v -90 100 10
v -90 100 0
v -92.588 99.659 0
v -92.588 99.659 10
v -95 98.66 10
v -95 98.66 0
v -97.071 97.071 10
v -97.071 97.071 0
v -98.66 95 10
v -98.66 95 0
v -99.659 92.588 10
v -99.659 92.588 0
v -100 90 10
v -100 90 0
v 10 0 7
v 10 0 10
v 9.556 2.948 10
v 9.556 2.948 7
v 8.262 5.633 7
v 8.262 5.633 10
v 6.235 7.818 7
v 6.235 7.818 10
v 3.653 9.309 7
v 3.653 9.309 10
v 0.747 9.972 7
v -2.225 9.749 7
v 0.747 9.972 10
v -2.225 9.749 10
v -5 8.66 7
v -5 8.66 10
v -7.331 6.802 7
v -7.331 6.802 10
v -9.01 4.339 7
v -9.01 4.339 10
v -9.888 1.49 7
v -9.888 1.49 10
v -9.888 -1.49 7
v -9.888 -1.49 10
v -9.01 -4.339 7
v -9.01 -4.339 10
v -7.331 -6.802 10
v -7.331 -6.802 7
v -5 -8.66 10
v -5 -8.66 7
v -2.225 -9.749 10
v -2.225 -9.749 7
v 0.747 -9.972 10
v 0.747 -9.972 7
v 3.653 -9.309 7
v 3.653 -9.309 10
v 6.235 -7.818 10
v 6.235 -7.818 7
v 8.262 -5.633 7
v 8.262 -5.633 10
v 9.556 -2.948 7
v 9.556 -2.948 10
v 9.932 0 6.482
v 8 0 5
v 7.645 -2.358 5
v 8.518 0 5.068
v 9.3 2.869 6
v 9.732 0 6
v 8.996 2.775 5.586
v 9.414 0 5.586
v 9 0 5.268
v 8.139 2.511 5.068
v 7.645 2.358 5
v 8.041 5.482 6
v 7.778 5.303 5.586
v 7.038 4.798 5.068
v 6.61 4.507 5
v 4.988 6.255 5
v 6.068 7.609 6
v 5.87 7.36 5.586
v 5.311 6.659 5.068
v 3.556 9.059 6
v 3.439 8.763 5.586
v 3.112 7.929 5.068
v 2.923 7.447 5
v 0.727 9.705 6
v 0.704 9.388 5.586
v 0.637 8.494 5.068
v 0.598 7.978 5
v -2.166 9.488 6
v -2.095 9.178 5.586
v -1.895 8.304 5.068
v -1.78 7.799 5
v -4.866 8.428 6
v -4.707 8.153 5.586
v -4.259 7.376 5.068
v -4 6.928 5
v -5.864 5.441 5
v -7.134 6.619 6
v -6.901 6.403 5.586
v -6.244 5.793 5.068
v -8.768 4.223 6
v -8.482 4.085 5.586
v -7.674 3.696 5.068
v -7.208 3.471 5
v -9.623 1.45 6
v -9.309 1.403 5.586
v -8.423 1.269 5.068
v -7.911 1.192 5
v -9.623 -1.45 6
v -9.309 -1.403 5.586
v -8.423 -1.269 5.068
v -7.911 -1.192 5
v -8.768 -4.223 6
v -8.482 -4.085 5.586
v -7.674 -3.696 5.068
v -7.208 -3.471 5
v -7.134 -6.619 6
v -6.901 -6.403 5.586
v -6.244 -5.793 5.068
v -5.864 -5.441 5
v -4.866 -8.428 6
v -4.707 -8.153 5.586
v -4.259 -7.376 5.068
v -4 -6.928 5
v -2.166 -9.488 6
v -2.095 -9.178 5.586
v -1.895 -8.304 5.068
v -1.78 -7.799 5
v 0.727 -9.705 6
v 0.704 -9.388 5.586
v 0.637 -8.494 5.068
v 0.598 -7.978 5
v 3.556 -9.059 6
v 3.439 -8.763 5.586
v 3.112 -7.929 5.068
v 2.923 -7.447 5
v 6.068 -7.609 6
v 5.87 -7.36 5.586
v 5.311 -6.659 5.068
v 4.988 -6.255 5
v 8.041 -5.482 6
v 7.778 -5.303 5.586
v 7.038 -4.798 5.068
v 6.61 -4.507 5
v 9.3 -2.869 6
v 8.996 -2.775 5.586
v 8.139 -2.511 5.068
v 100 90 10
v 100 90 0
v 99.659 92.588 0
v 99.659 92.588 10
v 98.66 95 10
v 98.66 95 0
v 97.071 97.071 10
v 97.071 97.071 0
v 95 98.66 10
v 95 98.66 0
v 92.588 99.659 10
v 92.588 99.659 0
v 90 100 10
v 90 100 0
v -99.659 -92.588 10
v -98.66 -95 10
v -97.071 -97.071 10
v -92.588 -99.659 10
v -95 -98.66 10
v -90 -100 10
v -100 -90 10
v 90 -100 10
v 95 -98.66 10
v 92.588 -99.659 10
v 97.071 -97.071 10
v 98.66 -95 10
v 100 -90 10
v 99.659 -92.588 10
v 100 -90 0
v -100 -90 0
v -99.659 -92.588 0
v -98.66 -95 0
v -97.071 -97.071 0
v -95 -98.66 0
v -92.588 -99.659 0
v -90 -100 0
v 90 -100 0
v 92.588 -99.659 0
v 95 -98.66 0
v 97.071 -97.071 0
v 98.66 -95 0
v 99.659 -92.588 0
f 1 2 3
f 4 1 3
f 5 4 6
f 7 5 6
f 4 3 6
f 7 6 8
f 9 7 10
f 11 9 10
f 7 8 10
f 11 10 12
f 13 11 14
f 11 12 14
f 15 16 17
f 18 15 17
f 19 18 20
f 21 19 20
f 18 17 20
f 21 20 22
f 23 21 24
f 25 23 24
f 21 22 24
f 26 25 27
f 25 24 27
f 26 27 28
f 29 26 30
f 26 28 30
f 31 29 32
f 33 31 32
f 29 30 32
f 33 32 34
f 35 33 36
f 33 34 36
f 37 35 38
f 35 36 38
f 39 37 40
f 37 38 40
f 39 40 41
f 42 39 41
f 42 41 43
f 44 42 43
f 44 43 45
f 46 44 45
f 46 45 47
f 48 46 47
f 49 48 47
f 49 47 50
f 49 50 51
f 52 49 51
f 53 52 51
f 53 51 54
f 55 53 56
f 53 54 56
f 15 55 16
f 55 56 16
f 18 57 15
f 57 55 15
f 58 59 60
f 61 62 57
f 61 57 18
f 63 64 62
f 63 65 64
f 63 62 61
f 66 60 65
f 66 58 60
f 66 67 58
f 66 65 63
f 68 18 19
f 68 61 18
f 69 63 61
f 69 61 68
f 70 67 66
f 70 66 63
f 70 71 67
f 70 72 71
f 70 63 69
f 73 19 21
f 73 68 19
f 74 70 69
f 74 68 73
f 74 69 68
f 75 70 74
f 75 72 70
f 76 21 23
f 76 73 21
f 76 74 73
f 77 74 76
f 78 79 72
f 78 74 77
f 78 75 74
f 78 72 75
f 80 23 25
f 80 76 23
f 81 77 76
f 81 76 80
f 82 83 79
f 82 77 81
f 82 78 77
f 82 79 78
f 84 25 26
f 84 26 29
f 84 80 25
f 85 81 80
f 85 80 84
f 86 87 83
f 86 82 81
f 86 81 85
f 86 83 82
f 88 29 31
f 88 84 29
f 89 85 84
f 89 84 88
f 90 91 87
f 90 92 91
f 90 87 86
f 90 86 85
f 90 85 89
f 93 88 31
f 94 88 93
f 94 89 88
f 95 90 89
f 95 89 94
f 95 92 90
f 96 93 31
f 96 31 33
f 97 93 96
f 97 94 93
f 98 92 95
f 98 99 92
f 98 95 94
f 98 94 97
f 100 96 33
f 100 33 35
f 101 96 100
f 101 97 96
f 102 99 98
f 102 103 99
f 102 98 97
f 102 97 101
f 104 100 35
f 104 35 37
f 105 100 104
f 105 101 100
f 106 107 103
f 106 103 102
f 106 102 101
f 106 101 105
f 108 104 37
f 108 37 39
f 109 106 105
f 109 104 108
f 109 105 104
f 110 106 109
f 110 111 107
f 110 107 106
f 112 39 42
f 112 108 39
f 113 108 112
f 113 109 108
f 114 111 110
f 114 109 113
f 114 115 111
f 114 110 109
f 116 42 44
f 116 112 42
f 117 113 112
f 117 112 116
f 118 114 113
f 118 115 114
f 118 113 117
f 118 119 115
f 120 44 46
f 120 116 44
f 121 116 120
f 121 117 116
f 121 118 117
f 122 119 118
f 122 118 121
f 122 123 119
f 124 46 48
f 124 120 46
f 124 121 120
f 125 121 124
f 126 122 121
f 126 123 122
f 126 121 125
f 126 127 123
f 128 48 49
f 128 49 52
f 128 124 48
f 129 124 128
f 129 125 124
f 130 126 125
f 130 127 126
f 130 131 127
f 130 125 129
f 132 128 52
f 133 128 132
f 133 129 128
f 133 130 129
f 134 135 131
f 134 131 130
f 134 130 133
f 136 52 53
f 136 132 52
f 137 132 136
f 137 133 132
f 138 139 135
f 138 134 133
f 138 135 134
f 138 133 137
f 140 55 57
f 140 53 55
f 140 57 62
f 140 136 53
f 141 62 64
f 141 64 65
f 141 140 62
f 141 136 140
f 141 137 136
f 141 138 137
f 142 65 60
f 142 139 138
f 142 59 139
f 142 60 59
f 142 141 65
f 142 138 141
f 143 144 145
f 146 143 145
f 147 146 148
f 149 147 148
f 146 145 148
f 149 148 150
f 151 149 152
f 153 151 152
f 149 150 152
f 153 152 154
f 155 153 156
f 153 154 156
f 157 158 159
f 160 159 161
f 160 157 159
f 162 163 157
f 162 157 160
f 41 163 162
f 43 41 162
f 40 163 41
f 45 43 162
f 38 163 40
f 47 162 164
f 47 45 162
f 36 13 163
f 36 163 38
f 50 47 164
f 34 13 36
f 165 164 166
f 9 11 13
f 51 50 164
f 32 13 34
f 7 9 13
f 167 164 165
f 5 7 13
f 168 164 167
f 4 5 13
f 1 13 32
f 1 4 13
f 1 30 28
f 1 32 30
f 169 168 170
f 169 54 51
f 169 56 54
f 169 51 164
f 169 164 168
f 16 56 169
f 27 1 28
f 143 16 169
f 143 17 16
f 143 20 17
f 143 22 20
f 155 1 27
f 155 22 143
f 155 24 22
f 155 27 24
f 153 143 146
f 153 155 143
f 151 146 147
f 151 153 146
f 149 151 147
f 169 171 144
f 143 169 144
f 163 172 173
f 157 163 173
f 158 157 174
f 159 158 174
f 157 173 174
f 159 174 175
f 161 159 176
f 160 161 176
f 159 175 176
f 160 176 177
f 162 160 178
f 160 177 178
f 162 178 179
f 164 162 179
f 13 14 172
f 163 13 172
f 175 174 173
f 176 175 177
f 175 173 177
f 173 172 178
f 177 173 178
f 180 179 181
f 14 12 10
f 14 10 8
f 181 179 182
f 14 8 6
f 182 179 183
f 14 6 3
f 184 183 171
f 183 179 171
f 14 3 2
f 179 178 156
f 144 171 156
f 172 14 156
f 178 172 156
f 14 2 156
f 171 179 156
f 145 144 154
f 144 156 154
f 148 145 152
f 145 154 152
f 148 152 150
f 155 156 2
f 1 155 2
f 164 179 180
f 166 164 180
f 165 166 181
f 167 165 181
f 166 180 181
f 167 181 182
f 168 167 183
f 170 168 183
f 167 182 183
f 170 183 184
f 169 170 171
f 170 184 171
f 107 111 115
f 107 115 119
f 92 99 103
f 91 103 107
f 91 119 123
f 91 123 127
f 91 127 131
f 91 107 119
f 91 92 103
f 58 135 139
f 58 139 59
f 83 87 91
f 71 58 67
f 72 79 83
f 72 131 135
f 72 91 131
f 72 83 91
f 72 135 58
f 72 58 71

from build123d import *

# Parameters (mm, degrees)
BOSS_EXTRUDE1_DEPTH = 10
SKETCH2_R           = 10
CUT_EXTRUDE2_DEPTH  = 5
FILLET1_R           = 2


with BuildPart() as part:
    # Sketch1 → Boss-Extrude1 (new body)
    with BuildSketch(Plane.XY):
        with BuildLine():
            Line((-90, -100), (90, -100))
            ThreePointArc((90, -100), (97.071067812, -97.071067812), (100, -90))
            Line((100, -90), (100, 90))
            ThreePointArc((100, 90), (97.071067812, 97.071067812), (90, 100))
            Line((90, 100), (-90, 100))
            ThreePointArc((-90, 100), (-97.071067812, 97.071067812), (-100, 90))
            Line((-100, 90), (-100, -90))
            ThreePointArc((-100, -90), (-97.071067812, -97.071067812), (-90, -100))
        make_face()
    extrude(amount=BOSS_EXTRUDE1_DEPTH)

    # Sketch2 → Cut-Extrude2 (cut)
    with BuildSketch(Plane.XY.offset(10)):
        Circle(SKETCH2_R)
    extrude(amount=-CUT_EXTRUDE2_DEPTH, mode=Mode.SUBTRACT)

    # Fillet1
    fillet1_edges = [part.edges().sort_by_distance(p)[0] for p in [
        (-10, 0, 5),
    ]]
    fillet(fillet1_edges, radius=FILLET1_R)


solid = part.part
